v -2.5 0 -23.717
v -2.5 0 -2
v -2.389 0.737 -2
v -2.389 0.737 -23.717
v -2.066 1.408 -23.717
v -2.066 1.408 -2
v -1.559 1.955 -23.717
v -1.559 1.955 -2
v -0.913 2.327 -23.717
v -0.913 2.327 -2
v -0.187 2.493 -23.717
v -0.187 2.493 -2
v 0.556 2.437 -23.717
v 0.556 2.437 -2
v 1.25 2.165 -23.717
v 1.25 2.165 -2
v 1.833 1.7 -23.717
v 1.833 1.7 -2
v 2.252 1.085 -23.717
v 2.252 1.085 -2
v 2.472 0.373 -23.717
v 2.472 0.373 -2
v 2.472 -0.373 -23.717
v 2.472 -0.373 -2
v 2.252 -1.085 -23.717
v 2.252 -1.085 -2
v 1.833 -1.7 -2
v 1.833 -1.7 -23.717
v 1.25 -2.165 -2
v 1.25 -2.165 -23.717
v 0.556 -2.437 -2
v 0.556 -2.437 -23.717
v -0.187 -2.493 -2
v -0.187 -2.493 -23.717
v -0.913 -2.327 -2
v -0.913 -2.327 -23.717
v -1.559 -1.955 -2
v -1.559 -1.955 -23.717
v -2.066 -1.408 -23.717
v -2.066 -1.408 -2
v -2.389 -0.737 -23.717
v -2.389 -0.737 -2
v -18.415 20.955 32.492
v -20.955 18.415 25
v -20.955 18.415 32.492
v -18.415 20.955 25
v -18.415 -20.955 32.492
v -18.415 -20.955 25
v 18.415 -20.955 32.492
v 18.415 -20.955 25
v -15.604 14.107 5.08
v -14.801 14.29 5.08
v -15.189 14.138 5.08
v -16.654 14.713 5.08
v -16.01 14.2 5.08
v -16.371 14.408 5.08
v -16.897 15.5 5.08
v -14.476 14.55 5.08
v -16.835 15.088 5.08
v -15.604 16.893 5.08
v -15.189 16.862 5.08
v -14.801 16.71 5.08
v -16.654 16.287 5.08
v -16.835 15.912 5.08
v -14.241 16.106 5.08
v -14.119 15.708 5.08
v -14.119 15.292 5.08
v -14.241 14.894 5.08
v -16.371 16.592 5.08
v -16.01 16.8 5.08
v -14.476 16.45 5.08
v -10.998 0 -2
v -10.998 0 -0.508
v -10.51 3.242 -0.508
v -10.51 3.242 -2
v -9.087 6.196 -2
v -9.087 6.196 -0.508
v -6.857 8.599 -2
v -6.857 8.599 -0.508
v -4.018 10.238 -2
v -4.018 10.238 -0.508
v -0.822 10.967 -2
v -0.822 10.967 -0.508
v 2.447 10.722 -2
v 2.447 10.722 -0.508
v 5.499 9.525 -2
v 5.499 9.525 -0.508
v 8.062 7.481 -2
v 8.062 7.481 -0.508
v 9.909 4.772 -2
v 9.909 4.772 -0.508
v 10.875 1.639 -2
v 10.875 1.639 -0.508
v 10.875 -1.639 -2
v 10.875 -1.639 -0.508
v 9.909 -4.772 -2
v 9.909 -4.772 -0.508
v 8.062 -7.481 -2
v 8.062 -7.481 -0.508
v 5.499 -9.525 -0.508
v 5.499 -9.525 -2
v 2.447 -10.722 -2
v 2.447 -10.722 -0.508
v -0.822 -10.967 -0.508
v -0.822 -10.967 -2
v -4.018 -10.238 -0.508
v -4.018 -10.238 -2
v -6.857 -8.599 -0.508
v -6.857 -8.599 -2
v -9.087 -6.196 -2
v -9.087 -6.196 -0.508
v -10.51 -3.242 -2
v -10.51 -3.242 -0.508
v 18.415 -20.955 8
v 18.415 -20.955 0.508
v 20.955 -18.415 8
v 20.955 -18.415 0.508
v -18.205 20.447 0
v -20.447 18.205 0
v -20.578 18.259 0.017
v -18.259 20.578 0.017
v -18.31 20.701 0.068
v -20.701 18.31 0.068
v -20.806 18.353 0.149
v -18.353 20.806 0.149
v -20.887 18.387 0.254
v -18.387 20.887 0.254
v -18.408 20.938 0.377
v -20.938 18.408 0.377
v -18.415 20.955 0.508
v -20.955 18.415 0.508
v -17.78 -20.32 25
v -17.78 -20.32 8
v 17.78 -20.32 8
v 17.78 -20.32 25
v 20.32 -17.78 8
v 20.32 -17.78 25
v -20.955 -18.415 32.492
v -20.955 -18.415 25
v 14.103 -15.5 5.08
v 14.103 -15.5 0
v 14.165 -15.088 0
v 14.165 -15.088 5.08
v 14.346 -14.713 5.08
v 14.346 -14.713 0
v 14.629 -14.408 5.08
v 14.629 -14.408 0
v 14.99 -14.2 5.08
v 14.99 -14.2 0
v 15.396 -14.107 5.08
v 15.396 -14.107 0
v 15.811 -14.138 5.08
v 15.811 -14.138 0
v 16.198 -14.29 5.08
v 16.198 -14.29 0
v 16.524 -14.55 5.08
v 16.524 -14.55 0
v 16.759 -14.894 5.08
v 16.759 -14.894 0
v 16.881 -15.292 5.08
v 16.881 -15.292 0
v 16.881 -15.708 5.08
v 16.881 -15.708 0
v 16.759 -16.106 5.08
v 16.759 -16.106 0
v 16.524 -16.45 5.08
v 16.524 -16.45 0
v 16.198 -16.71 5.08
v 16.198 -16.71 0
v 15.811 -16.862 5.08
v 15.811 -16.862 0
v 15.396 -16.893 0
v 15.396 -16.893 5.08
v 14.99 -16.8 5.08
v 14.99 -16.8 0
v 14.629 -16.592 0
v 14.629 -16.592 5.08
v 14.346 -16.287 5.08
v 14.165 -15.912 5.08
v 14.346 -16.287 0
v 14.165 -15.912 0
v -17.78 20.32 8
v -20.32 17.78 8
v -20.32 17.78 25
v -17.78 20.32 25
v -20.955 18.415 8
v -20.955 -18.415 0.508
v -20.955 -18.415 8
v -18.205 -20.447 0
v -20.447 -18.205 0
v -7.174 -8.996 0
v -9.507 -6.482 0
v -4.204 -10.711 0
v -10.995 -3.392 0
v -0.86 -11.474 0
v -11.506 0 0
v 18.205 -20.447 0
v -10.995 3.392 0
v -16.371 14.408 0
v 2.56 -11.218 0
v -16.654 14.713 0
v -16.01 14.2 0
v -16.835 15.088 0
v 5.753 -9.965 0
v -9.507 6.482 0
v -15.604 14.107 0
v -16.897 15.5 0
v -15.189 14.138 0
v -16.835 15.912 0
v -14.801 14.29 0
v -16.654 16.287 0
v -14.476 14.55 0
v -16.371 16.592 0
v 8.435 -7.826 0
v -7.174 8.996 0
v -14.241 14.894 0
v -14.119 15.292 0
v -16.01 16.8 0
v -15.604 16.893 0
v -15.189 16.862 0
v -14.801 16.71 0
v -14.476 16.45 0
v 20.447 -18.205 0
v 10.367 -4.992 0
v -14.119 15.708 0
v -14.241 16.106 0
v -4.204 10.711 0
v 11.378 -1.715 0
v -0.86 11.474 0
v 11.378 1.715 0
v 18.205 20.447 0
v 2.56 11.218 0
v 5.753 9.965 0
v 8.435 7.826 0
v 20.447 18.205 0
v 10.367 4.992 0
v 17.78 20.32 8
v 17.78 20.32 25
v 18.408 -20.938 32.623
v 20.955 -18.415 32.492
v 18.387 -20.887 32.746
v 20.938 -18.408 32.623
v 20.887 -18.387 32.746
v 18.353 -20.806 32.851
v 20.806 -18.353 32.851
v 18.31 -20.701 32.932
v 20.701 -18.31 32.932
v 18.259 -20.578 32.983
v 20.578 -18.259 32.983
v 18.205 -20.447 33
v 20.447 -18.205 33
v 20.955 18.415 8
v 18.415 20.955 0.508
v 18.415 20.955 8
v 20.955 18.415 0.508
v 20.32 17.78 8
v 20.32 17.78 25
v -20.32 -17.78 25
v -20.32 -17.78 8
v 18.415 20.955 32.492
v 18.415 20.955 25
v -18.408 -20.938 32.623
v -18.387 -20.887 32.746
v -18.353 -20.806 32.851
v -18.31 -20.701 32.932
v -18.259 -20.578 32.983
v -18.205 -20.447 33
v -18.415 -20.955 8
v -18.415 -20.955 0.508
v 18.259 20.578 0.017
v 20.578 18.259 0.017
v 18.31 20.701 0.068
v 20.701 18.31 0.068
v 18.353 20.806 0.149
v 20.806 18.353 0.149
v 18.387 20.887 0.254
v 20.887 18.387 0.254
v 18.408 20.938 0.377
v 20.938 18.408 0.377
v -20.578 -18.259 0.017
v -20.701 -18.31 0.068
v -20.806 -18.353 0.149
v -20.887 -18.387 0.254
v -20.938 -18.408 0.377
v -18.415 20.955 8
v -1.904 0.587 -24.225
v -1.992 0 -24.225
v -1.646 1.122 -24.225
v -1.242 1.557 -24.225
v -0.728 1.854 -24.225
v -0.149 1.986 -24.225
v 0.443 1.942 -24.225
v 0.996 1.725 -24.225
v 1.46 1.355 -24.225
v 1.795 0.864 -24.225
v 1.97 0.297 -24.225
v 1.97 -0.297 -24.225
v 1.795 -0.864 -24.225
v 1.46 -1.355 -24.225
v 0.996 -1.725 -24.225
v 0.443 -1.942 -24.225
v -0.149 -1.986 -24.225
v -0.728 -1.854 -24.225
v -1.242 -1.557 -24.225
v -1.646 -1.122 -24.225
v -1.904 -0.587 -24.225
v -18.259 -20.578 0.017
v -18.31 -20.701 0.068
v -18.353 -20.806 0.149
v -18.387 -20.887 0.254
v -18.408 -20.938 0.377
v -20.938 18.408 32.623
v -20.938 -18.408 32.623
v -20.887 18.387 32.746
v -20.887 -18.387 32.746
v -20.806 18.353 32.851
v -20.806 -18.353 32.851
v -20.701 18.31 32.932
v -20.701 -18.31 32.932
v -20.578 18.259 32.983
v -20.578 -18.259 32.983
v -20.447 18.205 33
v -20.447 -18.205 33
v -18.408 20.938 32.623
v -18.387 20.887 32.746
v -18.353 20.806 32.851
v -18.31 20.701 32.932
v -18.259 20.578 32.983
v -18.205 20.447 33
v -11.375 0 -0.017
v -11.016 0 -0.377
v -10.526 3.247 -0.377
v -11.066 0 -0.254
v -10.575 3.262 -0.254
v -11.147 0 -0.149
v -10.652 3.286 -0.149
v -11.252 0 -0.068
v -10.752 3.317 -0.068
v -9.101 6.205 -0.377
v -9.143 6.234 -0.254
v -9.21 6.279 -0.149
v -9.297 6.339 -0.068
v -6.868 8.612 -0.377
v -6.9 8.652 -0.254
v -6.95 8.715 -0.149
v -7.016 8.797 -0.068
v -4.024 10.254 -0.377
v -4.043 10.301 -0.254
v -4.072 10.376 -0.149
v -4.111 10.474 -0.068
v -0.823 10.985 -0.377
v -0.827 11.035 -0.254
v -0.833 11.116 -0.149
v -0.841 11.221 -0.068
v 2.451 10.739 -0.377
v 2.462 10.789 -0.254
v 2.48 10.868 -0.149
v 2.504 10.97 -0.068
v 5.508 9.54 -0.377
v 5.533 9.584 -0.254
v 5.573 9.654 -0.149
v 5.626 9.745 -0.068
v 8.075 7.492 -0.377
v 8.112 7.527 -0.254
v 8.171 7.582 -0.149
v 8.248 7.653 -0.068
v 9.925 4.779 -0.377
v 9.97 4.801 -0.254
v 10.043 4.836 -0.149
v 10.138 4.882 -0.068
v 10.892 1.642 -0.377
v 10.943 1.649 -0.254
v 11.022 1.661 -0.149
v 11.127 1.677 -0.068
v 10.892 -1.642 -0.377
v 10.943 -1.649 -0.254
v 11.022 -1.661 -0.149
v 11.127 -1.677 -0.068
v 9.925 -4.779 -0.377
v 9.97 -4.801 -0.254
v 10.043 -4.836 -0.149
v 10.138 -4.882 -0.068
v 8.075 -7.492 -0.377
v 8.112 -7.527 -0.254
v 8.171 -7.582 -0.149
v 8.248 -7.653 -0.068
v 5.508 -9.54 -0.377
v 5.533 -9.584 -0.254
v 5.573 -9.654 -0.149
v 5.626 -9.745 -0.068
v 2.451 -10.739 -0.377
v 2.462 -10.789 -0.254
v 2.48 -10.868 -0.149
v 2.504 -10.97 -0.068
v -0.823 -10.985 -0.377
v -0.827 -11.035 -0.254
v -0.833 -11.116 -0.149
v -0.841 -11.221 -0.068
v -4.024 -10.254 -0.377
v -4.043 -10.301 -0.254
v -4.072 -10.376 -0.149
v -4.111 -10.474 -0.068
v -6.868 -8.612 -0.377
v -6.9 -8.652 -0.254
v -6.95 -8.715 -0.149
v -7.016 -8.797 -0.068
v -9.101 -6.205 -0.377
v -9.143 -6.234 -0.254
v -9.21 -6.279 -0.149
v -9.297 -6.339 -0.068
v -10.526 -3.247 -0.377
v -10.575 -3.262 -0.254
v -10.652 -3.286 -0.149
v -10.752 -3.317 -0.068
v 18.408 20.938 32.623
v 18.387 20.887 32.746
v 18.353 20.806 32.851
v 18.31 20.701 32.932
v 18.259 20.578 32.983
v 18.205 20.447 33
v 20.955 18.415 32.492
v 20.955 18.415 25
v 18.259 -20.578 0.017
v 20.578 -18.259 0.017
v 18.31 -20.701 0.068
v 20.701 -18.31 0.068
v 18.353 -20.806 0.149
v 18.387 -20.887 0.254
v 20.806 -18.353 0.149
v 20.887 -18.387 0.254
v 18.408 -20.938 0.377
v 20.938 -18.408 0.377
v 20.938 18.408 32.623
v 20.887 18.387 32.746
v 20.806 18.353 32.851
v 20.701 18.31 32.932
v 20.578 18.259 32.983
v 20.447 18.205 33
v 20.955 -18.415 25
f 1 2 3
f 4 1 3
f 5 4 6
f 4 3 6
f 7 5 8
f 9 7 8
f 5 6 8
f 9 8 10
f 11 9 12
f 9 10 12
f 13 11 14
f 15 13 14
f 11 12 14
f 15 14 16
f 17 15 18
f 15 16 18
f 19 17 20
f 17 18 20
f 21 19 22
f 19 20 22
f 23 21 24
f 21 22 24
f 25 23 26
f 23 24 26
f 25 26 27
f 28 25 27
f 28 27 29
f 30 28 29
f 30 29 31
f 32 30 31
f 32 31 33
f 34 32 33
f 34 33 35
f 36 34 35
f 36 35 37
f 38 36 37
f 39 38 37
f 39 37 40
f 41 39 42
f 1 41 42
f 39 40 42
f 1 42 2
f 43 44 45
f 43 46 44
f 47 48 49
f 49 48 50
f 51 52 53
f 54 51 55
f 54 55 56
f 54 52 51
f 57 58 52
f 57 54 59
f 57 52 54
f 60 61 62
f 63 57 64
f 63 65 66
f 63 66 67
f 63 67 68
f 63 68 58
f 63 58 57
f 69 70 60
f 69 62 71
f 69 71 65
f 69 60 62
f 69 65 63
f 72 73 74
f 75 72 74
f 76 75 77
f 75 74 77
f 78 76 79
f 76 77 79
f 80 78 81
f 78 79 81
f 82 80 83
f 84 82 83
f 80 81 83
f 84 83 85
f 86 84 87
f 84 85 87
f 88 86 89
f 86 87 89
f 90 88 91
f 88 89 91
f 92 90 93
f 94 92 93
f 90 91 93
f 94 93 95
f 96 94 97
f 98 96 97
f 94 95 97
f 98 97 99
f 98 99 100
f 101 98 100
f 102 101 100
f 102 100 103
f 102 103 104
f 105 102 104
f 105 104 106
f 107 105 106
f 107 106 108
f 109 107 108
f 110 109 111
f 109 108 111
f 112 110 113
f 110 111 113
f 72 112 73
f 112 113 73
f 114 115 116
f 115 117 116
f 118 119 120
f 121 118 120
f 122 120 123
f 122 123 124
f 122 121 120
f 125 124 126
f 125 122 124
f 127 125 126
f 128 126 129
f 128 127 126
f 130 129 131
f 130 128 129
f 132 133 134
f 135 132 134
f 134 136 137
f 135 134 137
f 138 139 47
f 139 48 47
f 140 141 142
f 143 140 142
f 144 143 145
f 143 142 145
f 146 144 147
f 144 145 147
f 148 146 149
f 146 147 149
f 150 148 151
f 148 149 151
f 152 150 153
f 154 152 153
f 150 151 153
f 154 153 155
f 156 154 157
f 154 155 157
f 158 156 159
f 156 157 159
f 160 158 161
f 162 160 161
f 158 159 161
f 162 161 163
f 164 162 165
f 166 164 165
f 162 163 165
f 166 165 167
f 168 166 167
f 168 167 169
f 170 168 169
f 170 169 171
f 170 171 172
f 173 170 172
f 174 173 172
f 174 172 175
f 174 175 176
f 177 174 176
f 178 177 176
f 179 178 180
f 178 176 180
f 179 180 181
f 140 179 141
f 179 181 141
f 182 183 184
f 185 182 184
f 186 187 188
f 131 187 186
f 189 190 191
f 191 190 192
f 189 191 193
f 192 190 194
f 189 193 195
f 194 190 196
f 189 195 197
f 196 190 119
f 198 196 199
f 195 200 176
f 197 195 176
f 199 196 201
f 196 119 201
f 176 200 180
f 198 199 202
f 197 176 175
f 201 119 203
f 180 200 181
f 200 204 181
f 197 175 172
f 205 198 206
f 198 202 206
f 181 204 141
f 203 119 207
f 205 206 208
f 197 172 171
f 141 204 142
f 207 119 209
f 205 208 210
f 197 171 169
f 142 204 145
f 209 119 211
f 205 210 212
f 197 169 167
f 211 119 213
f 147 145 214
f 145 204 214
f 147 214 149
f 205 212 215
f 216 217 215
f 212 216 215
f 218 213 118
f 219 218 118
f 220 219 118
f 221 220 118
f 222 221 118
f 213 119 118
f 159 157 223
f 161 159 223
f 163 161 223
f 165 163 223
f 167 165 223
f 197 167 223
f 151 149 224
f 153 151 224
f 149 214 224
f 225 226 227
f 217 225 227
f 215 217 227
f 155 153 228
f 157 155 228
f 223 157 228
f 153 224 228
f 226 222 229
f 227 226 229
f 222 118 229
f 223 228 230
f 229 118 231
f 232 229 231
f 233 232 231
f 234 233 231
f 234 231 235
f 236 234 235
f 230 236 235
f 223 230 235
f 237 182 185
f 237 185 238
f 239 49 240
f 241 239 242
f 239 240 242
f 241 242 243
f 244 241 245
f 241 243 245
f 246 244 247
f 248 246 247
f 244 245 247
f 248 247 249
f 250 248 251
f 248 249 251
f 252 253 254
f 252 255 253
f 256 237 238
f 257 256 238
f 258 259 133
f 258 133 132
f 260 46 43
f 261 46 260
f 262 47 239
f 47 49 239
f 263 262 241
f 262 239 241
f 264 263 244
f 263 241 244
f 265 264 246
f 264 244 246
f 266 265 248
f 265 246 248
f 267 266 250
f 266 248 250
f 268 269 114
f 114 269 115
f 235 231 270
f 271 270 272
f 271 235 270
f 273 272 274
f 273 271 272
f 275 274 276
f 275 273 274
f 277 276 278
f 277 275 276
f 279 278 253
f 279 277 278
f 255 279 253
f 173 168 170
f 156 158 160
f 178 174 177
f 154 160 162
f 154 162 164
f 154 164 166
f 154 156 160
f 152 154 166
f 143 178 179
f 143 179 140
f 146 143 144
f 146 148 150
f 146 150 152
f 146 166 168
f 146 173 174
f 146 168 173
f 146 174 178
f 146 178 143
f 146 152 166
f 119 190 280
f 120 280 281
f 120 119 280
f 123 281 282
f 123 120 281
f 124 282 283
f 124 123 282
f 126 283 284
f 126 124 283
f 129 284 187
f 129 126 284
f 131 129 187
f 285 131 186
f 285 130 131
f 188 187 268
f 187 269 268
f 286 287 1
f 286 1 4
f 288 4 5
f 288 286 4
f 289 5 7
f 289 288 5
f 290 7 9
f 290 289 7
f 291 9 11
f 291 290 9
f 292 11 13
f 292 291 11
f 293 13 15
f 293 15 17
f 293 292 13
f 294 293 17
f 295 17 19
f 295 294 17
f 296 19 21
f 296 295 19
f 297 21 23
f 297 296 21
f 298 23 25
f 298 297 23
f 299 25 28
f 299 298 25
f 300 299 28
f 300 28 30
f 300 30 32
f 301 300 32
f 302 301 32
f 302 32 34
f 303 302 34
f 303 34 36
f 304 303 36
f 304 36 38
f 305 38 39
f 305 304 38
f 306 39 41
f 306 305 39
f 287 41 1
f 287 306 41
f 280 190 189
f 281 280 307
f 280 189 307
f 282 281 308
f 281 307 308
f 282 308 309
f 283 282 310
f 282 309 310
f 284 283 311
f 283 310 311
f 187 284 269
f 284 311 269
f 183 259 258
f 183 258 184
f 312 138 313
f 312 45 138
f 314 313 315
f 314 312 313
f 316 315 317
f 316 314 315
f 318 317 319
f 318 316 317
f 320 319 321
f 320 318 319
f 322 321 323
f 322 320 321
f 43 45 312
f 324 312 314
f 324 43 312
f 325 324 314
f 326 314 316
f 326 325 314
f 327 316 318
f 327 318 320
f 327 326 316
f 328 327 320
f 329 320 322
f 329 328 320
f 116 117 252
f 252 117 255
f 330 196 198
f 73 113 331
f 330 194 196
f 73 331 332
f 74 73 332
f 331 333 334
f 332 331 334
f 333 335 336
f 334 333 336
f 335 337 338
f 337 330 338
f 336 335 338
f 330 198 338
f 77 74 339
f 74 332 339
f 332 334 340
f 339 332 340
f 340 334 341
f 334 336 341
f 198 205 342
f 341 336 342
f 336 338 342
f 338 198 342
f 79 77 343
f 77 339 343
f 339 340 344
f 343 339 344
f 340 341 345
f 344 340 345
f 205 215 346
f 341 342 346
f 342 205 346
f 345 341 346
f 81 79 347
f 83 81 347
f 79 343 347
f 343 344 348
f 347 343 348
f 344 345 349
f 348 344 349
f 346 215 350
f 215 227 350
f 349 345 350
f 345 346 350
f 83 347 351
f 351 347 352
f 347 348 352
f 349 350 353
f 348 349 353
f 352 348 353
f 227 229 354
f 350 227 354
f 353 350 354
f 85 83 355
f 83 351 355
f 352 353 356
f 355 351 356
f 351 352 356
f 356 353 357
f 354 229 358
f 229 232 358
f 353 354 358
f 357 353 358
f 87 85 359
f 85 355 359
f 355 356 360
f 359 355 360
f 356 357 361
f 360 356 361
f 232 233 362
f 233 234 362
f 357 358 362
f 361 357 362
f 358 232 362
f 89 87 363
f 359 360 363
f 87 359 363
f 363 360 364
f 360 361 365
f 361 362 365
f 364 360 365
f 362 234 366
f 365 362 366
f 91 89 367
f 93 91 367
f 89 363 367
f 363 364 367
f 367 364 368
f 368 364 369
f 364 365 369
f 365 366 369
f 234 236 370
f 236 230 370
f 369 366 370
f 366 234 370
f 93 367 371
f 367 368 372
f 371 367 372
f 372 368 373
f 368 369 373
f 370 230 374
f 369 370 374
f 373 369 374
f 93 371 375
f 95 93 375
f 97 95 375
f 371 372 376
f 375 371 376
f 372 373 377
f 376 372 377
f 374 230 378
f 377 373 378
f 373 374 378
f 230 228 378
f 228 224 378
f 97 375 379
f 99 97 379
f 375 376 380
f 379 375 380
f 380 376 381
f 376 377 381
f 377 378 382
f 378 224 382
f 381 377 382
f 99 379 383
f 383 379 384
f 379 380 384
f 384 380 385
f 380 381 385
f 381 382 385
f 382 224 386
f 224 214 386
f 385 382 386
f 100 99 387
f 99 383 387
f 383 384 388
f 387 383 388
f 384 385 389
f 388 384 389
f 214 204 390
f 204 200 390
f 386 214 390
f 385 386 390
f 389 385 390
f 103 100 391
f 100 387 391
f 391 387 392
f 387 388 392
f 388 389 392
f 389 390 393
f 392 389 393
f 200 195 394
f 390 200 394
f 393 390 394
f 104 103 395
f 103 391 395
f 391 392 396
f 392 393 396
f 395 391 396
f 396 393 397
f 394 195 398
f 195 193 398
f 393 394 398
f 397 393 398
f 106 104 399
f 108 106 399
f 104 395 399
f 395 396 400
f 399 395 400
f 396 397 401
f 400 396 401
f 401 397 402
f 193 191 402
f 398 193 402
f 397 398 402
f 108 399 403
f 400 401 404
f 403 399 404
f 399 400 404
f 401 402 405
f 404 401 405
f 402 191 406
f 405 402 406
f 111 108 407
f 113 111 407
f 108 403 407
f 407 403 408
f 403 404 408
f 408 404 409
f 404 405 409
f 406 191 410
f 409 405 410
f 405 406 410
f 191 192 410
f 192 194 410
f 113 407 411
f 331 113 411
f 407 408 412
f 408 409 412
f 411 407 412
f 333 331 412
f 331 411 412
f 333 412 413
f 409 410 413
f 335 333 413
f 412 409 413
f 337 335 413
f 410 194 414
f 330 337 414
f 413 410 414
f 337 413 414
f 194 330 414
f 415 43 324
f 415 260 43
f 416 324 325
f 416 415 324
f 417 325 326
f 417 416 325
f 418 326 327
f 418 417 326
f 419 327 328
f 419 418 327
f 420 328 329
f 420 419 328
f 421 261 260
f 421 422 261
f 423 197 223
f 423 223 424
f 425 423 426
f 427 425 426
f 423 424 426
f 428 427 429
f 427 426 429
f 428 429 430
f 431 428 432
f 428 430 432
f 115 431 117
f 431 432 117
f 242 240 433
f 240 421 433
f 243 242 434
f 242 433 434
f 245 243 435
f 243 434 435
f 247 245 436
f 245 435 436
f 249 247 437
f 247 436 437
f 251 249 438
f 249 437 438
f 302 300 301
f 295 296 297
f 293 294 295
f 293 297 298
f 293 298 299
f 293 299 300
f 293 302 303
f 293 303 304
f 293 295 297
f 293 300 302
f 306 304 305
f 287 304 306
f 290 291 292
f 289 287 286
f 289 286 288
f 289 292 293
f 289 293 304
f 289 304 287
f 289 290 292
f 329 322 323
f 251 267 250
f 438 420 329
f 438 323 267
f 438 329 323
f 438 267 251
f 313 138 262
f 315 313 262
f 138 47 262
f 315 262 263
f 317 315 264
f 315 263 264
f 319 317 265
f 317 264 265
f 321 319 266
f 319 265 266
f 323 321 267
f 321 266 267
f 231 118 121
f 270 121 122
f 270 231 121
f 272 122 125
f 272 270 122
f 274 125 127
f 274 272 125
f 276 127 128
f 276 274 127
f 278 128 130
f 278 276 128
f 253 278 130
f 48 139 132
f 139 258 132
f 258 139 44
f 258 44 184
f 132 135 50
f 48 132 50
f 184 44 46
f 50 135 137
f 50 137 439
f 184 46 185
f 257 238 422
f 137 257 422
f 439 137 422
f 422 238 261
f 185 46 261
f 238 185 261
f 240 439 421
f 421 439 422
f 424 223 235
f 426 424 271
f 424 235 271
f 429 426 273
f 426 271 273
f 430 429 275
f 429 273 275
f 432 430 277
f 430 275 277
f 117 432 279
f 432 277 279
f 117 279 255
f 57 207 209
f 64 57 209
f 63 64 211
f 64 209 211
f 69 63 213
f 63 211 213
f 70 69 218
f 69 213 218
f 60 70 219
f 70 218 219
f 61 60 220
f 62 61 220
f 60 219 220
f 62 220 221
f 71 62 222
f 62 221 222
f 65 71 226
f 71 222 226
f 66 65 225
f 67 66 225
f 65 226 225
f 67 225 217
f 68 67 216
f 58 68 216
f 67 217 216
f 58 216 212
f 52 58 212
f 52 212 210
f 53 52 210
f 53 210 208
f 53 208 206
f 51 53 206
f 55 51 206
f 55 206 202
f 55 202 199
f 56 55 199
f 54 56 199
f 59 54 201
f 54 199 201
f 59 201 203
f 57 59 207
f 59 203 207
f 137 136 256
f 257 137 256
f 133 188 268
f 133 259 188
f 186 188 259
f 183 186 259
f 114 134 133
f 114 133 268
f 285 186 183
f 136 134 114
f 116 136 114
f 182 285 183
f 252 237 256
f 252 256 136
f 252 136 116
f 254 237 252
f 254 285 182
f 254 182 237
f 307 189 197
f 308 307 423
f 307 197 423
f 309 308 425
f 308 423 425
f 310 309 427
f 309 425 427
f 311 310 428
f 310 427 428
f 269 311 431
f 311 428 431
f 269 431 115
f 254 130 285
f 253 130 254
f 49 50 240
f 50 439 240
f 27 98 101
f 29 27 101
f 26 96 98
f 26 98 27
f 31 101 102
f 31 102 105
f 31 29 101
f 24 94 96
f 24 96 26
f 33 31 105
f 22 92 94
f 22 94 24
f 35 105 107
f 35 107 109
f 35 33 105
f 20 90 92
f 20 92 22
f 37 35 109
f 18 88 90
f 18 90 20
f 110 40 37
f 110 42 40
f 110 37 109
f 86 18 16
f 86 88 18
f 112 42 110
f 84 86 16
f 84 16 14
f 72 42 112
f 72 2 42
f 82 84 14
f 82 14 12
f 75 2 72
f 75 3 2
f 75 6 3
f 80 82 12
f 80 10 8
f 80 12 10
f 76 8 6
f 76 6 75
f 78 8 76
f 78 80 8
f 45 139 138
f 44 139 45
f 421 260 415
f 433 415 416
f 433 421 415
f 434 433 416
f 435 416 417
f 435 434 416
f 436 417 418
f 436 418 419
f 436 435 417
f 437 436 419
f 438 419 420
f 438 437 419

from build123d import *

# Parameters (mm, degrees)
SKETCH1_W           = 41.91
SKETCH1_H           = 41.91
BOSS_EXTRUDE1_DEPTH = 8
SKETCH2_W           = 40.64
SKETCH2_H           = 40.64
BOSS_EXTRUDE2_DEPTH = 17
SKETCH3_W           = 41.91
SKETCH3_H           = 41.91
BOSS_EXTRUDE3_DEPTH = 8
CHAMFER1_SIZE       = 2.54
CHAMFER2_SIZE       = 2.54
SKETCH4_R           = 10.9982
BOSS_EXTRUDE4_DEPTH = 2
SKETCH5_R           = 2.5
BOSS_EXTRUDE5_DEPTH = 22.225
CHAMFER3_SIZE       = 0.508
FILLET2_R           = 0.508
SKETCH6_R           = 1.397
CUT_EXTRUDE1_DEPTH  = 5.08


with BuildPart() as part:
    # Sketch1 → Boss-Extrude1 (new body)
    with BuildSketch(Plane.XY):
        Rectangle(SKETCH1_W, SKETCH1_H)
    extrude(amount=BOSS_EXTRUDE1_DEPTH)

    # Sketch2 → Boss-Extrude2 (add)
    with BuildSketch(Plane.XY.offset(8)):
        Rectangle(SKETCH2_W, SKETCH2_H)
    extrude(amount=BOSS_EXTRUDE2_DEPTH)

    # Sketch3 → Boss-Extrude3 (add)
    with BuildSketch(Plane.XY.offset(25)):
        Rectangle(SKETCH3_W, SKETCH3_H)
    extrude(amount=BOSS_EXTRUDE3_DEPTH)

    # Chamfer1
    chamfer1_edges = [part.edges().sort_by_distance(p)[0] for p in [
        (20.32, -20.32, 16.5),
        (20.32, 20.32, 16.5),
        (-20.32, 20.32, 16.5),
        (-20.32, -20.32, 16.5),
    ]]
    chamfer(chamfer1_edges, length=CHAMFER1_SIZE)

    # Chamfer2
    chamfer2_edges = [part.edges().sort_by_distance(p)[0] for p in [
        (20.955, -20.955, 29),
        (20.955, 20.955, 29),
        (-20.955, 20.955, 29),
        (-20.955, -20.955, 29),
        (20.955, -20.955, 4),
        (-20.955, -20.955, 4),
        (-20.955, 20.955, 4),
        (20.955, 20.955, 4),
    ]]
    chamfer(chamfer2_edges, length=CHAMFER2_SIZE)

    # Sketch4 → Boss-Extrude4 (add)
    with BuildSketch(Plane(origin=(0, 0, 0), x_dir=(-1, 0, 0), z_dir=(0, 0, -1))):
        Circle(SKETCH4_R)
    extrude(amount=BOSS_EXTRUDE4_DEPTH)

    # Sketch5 → Boss-Extrude5 (add)
    with BuildSketch(Plane(origin=(0, 0, -2), x_dir=(-1, 0, 0), z_dir=(0, 0, -1))):
        Circle(SKETCH5_R)
    extrude(amount=BOSS_EXTRUDE5_DEPTH)

    # Chamfer3
    chamfer3_edges = [part.edges().sort_by_distance(p)[0] for p in [
        (2.5, 0, -24.225),
    ]]
    chamfer(chamfer3_edges, length=CHAMFER3_SIZE)

    # Fillet2
    fillet2_edges = [part.edges().sort_by_distance(p)[0] for p in [
        (10.9982, 0, 0),
        (0, 20.955, 33),
        (20.955, 0, 33),
        (-20.955, 0, 33),
        (0, -20.955, 33),
        (19.685, -19.685, 33),
        (-19.685, -19.685, 33),
        (-19.685, 19.685, 33),
        (19.685, 19.685, 33),
        (0, 20.955, 0),
        (20.955, 0, 0),
        (0, -20.955, 0),
        (-20.955, 0, 0),
        (19.685, -19.685, 0),
        (-19.685, -19.685, 0),
        (-19.685, 19.685, 0),
        (19.685, 19.685, 0),
    ]]
    fillet(fillet2_edges, radius=FILLET2_R)

    # Sketch6 → Cut-Extrude1 (cut)
    with BuildSketch(Plane(origin=(0, 0, 0), x_dir=(-1, 0, 0), z_dir=(0, 0, -1))):
        with Locations((15.5, 15.5)):
            Circle(SKETCH6_R)
        with Locations((-15.5, -15.5)):
            Circle(SKETCH6_R)
    extrude(amount=-CUT_EXTRUDE1_DEPTH, mode=Mode.SUBTRACT)


solid = part.part
